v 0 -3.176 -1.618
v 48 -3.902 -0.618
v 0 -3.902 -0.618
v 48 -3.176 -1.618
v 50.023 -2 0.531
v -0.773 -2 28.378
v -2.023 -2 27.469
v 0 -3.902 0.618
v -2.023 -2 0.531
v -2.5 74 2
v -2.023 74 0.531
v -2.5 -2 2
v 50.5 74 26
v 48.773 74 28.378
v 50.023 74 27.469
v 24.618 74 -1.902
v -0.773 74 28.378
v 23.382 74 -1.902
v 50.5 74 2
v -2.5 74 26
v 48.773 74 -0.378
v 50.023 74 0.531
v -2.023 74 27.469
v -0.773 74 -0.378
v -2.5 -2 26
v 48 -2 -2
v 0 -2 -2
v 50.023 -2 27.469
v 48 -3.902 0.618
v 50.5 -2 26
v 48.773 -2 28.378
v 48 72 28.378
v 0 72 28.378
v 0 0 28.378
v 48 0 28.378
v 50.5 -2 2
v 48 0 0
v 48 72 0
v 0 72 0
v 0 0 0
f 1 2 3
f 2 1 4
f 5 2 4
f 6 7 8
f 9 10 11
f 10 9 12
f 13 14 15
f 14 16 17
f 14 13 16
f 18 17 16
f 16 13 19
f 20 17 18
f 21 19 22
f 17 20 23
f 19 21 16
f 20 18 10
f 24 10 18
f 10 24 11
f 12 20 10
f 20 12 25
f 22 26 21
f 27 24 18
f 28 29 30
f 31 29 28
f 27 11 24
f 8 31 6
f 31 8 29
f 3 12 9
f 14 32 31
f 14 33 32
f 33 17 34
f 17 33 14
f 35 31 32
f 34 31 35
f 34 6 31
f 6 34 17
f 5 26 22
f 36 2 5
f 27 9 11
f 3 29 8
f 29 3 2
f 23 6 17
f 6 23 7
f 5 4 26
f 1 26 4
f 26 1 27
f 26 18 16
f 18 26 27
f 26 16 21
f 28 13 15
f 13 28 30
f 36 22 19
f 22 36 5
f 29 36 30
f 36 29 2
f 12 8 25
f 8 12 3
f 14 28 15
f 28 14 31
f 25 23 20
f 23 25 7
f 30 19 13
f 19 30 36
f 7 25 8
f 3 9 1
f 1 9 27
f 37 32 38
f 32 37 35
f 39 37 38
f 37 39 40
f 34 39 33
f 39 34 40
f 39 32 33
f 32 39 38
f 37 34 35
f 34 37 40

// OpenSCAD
space_inside = 48;
space_inside_long = 72;
space_inside_high  = 30;

space = 4;


difference() {
hull() {
translate( [ 0, -2, 2])
    rotate( [-90, 0, 0])
        cylinder( d = space+1, $fn = 10, h = space_inside_long+4);
    translate( [ 0, -2, space_inside_high-space])
    rotate( [-90, 0, 0])
        cylinder( d = space+1, $fn = 10, h = space_inside_long+4);
    
    
translate( [ space_inside, -2, 2])
    rotate( [-90, 0, 0])
        cylinder( d = space+1, $fn = 10, h = space_inside_long+4);
    
    translate( [ space_inside, -2, space_inside_high-space])
    rotate( [-90, 0, 0])
        cylinder( d = space+1, $fn = 10, h = space_inside_long+4);
    
translate( [ space_inside/2, -2, 0])
    rotate( [-90, 0, 0])
        cylinder( d = space, $fn = 10, h = space_inside_long+4);
    
    // bakcside
    translate( [0, -2, 0])
    rotate( [0, 90, 0])
    cylinder( d = space, $fn = 10, h = space_inside);
    translate( [0, -2, 0])
    rotate( [0, 90, 0])
    cylinder( d = space, $fn = 10, h = space_inside);
    
    
}
cube( [space_inside, space_inside_long, space_inside_high] );

}
